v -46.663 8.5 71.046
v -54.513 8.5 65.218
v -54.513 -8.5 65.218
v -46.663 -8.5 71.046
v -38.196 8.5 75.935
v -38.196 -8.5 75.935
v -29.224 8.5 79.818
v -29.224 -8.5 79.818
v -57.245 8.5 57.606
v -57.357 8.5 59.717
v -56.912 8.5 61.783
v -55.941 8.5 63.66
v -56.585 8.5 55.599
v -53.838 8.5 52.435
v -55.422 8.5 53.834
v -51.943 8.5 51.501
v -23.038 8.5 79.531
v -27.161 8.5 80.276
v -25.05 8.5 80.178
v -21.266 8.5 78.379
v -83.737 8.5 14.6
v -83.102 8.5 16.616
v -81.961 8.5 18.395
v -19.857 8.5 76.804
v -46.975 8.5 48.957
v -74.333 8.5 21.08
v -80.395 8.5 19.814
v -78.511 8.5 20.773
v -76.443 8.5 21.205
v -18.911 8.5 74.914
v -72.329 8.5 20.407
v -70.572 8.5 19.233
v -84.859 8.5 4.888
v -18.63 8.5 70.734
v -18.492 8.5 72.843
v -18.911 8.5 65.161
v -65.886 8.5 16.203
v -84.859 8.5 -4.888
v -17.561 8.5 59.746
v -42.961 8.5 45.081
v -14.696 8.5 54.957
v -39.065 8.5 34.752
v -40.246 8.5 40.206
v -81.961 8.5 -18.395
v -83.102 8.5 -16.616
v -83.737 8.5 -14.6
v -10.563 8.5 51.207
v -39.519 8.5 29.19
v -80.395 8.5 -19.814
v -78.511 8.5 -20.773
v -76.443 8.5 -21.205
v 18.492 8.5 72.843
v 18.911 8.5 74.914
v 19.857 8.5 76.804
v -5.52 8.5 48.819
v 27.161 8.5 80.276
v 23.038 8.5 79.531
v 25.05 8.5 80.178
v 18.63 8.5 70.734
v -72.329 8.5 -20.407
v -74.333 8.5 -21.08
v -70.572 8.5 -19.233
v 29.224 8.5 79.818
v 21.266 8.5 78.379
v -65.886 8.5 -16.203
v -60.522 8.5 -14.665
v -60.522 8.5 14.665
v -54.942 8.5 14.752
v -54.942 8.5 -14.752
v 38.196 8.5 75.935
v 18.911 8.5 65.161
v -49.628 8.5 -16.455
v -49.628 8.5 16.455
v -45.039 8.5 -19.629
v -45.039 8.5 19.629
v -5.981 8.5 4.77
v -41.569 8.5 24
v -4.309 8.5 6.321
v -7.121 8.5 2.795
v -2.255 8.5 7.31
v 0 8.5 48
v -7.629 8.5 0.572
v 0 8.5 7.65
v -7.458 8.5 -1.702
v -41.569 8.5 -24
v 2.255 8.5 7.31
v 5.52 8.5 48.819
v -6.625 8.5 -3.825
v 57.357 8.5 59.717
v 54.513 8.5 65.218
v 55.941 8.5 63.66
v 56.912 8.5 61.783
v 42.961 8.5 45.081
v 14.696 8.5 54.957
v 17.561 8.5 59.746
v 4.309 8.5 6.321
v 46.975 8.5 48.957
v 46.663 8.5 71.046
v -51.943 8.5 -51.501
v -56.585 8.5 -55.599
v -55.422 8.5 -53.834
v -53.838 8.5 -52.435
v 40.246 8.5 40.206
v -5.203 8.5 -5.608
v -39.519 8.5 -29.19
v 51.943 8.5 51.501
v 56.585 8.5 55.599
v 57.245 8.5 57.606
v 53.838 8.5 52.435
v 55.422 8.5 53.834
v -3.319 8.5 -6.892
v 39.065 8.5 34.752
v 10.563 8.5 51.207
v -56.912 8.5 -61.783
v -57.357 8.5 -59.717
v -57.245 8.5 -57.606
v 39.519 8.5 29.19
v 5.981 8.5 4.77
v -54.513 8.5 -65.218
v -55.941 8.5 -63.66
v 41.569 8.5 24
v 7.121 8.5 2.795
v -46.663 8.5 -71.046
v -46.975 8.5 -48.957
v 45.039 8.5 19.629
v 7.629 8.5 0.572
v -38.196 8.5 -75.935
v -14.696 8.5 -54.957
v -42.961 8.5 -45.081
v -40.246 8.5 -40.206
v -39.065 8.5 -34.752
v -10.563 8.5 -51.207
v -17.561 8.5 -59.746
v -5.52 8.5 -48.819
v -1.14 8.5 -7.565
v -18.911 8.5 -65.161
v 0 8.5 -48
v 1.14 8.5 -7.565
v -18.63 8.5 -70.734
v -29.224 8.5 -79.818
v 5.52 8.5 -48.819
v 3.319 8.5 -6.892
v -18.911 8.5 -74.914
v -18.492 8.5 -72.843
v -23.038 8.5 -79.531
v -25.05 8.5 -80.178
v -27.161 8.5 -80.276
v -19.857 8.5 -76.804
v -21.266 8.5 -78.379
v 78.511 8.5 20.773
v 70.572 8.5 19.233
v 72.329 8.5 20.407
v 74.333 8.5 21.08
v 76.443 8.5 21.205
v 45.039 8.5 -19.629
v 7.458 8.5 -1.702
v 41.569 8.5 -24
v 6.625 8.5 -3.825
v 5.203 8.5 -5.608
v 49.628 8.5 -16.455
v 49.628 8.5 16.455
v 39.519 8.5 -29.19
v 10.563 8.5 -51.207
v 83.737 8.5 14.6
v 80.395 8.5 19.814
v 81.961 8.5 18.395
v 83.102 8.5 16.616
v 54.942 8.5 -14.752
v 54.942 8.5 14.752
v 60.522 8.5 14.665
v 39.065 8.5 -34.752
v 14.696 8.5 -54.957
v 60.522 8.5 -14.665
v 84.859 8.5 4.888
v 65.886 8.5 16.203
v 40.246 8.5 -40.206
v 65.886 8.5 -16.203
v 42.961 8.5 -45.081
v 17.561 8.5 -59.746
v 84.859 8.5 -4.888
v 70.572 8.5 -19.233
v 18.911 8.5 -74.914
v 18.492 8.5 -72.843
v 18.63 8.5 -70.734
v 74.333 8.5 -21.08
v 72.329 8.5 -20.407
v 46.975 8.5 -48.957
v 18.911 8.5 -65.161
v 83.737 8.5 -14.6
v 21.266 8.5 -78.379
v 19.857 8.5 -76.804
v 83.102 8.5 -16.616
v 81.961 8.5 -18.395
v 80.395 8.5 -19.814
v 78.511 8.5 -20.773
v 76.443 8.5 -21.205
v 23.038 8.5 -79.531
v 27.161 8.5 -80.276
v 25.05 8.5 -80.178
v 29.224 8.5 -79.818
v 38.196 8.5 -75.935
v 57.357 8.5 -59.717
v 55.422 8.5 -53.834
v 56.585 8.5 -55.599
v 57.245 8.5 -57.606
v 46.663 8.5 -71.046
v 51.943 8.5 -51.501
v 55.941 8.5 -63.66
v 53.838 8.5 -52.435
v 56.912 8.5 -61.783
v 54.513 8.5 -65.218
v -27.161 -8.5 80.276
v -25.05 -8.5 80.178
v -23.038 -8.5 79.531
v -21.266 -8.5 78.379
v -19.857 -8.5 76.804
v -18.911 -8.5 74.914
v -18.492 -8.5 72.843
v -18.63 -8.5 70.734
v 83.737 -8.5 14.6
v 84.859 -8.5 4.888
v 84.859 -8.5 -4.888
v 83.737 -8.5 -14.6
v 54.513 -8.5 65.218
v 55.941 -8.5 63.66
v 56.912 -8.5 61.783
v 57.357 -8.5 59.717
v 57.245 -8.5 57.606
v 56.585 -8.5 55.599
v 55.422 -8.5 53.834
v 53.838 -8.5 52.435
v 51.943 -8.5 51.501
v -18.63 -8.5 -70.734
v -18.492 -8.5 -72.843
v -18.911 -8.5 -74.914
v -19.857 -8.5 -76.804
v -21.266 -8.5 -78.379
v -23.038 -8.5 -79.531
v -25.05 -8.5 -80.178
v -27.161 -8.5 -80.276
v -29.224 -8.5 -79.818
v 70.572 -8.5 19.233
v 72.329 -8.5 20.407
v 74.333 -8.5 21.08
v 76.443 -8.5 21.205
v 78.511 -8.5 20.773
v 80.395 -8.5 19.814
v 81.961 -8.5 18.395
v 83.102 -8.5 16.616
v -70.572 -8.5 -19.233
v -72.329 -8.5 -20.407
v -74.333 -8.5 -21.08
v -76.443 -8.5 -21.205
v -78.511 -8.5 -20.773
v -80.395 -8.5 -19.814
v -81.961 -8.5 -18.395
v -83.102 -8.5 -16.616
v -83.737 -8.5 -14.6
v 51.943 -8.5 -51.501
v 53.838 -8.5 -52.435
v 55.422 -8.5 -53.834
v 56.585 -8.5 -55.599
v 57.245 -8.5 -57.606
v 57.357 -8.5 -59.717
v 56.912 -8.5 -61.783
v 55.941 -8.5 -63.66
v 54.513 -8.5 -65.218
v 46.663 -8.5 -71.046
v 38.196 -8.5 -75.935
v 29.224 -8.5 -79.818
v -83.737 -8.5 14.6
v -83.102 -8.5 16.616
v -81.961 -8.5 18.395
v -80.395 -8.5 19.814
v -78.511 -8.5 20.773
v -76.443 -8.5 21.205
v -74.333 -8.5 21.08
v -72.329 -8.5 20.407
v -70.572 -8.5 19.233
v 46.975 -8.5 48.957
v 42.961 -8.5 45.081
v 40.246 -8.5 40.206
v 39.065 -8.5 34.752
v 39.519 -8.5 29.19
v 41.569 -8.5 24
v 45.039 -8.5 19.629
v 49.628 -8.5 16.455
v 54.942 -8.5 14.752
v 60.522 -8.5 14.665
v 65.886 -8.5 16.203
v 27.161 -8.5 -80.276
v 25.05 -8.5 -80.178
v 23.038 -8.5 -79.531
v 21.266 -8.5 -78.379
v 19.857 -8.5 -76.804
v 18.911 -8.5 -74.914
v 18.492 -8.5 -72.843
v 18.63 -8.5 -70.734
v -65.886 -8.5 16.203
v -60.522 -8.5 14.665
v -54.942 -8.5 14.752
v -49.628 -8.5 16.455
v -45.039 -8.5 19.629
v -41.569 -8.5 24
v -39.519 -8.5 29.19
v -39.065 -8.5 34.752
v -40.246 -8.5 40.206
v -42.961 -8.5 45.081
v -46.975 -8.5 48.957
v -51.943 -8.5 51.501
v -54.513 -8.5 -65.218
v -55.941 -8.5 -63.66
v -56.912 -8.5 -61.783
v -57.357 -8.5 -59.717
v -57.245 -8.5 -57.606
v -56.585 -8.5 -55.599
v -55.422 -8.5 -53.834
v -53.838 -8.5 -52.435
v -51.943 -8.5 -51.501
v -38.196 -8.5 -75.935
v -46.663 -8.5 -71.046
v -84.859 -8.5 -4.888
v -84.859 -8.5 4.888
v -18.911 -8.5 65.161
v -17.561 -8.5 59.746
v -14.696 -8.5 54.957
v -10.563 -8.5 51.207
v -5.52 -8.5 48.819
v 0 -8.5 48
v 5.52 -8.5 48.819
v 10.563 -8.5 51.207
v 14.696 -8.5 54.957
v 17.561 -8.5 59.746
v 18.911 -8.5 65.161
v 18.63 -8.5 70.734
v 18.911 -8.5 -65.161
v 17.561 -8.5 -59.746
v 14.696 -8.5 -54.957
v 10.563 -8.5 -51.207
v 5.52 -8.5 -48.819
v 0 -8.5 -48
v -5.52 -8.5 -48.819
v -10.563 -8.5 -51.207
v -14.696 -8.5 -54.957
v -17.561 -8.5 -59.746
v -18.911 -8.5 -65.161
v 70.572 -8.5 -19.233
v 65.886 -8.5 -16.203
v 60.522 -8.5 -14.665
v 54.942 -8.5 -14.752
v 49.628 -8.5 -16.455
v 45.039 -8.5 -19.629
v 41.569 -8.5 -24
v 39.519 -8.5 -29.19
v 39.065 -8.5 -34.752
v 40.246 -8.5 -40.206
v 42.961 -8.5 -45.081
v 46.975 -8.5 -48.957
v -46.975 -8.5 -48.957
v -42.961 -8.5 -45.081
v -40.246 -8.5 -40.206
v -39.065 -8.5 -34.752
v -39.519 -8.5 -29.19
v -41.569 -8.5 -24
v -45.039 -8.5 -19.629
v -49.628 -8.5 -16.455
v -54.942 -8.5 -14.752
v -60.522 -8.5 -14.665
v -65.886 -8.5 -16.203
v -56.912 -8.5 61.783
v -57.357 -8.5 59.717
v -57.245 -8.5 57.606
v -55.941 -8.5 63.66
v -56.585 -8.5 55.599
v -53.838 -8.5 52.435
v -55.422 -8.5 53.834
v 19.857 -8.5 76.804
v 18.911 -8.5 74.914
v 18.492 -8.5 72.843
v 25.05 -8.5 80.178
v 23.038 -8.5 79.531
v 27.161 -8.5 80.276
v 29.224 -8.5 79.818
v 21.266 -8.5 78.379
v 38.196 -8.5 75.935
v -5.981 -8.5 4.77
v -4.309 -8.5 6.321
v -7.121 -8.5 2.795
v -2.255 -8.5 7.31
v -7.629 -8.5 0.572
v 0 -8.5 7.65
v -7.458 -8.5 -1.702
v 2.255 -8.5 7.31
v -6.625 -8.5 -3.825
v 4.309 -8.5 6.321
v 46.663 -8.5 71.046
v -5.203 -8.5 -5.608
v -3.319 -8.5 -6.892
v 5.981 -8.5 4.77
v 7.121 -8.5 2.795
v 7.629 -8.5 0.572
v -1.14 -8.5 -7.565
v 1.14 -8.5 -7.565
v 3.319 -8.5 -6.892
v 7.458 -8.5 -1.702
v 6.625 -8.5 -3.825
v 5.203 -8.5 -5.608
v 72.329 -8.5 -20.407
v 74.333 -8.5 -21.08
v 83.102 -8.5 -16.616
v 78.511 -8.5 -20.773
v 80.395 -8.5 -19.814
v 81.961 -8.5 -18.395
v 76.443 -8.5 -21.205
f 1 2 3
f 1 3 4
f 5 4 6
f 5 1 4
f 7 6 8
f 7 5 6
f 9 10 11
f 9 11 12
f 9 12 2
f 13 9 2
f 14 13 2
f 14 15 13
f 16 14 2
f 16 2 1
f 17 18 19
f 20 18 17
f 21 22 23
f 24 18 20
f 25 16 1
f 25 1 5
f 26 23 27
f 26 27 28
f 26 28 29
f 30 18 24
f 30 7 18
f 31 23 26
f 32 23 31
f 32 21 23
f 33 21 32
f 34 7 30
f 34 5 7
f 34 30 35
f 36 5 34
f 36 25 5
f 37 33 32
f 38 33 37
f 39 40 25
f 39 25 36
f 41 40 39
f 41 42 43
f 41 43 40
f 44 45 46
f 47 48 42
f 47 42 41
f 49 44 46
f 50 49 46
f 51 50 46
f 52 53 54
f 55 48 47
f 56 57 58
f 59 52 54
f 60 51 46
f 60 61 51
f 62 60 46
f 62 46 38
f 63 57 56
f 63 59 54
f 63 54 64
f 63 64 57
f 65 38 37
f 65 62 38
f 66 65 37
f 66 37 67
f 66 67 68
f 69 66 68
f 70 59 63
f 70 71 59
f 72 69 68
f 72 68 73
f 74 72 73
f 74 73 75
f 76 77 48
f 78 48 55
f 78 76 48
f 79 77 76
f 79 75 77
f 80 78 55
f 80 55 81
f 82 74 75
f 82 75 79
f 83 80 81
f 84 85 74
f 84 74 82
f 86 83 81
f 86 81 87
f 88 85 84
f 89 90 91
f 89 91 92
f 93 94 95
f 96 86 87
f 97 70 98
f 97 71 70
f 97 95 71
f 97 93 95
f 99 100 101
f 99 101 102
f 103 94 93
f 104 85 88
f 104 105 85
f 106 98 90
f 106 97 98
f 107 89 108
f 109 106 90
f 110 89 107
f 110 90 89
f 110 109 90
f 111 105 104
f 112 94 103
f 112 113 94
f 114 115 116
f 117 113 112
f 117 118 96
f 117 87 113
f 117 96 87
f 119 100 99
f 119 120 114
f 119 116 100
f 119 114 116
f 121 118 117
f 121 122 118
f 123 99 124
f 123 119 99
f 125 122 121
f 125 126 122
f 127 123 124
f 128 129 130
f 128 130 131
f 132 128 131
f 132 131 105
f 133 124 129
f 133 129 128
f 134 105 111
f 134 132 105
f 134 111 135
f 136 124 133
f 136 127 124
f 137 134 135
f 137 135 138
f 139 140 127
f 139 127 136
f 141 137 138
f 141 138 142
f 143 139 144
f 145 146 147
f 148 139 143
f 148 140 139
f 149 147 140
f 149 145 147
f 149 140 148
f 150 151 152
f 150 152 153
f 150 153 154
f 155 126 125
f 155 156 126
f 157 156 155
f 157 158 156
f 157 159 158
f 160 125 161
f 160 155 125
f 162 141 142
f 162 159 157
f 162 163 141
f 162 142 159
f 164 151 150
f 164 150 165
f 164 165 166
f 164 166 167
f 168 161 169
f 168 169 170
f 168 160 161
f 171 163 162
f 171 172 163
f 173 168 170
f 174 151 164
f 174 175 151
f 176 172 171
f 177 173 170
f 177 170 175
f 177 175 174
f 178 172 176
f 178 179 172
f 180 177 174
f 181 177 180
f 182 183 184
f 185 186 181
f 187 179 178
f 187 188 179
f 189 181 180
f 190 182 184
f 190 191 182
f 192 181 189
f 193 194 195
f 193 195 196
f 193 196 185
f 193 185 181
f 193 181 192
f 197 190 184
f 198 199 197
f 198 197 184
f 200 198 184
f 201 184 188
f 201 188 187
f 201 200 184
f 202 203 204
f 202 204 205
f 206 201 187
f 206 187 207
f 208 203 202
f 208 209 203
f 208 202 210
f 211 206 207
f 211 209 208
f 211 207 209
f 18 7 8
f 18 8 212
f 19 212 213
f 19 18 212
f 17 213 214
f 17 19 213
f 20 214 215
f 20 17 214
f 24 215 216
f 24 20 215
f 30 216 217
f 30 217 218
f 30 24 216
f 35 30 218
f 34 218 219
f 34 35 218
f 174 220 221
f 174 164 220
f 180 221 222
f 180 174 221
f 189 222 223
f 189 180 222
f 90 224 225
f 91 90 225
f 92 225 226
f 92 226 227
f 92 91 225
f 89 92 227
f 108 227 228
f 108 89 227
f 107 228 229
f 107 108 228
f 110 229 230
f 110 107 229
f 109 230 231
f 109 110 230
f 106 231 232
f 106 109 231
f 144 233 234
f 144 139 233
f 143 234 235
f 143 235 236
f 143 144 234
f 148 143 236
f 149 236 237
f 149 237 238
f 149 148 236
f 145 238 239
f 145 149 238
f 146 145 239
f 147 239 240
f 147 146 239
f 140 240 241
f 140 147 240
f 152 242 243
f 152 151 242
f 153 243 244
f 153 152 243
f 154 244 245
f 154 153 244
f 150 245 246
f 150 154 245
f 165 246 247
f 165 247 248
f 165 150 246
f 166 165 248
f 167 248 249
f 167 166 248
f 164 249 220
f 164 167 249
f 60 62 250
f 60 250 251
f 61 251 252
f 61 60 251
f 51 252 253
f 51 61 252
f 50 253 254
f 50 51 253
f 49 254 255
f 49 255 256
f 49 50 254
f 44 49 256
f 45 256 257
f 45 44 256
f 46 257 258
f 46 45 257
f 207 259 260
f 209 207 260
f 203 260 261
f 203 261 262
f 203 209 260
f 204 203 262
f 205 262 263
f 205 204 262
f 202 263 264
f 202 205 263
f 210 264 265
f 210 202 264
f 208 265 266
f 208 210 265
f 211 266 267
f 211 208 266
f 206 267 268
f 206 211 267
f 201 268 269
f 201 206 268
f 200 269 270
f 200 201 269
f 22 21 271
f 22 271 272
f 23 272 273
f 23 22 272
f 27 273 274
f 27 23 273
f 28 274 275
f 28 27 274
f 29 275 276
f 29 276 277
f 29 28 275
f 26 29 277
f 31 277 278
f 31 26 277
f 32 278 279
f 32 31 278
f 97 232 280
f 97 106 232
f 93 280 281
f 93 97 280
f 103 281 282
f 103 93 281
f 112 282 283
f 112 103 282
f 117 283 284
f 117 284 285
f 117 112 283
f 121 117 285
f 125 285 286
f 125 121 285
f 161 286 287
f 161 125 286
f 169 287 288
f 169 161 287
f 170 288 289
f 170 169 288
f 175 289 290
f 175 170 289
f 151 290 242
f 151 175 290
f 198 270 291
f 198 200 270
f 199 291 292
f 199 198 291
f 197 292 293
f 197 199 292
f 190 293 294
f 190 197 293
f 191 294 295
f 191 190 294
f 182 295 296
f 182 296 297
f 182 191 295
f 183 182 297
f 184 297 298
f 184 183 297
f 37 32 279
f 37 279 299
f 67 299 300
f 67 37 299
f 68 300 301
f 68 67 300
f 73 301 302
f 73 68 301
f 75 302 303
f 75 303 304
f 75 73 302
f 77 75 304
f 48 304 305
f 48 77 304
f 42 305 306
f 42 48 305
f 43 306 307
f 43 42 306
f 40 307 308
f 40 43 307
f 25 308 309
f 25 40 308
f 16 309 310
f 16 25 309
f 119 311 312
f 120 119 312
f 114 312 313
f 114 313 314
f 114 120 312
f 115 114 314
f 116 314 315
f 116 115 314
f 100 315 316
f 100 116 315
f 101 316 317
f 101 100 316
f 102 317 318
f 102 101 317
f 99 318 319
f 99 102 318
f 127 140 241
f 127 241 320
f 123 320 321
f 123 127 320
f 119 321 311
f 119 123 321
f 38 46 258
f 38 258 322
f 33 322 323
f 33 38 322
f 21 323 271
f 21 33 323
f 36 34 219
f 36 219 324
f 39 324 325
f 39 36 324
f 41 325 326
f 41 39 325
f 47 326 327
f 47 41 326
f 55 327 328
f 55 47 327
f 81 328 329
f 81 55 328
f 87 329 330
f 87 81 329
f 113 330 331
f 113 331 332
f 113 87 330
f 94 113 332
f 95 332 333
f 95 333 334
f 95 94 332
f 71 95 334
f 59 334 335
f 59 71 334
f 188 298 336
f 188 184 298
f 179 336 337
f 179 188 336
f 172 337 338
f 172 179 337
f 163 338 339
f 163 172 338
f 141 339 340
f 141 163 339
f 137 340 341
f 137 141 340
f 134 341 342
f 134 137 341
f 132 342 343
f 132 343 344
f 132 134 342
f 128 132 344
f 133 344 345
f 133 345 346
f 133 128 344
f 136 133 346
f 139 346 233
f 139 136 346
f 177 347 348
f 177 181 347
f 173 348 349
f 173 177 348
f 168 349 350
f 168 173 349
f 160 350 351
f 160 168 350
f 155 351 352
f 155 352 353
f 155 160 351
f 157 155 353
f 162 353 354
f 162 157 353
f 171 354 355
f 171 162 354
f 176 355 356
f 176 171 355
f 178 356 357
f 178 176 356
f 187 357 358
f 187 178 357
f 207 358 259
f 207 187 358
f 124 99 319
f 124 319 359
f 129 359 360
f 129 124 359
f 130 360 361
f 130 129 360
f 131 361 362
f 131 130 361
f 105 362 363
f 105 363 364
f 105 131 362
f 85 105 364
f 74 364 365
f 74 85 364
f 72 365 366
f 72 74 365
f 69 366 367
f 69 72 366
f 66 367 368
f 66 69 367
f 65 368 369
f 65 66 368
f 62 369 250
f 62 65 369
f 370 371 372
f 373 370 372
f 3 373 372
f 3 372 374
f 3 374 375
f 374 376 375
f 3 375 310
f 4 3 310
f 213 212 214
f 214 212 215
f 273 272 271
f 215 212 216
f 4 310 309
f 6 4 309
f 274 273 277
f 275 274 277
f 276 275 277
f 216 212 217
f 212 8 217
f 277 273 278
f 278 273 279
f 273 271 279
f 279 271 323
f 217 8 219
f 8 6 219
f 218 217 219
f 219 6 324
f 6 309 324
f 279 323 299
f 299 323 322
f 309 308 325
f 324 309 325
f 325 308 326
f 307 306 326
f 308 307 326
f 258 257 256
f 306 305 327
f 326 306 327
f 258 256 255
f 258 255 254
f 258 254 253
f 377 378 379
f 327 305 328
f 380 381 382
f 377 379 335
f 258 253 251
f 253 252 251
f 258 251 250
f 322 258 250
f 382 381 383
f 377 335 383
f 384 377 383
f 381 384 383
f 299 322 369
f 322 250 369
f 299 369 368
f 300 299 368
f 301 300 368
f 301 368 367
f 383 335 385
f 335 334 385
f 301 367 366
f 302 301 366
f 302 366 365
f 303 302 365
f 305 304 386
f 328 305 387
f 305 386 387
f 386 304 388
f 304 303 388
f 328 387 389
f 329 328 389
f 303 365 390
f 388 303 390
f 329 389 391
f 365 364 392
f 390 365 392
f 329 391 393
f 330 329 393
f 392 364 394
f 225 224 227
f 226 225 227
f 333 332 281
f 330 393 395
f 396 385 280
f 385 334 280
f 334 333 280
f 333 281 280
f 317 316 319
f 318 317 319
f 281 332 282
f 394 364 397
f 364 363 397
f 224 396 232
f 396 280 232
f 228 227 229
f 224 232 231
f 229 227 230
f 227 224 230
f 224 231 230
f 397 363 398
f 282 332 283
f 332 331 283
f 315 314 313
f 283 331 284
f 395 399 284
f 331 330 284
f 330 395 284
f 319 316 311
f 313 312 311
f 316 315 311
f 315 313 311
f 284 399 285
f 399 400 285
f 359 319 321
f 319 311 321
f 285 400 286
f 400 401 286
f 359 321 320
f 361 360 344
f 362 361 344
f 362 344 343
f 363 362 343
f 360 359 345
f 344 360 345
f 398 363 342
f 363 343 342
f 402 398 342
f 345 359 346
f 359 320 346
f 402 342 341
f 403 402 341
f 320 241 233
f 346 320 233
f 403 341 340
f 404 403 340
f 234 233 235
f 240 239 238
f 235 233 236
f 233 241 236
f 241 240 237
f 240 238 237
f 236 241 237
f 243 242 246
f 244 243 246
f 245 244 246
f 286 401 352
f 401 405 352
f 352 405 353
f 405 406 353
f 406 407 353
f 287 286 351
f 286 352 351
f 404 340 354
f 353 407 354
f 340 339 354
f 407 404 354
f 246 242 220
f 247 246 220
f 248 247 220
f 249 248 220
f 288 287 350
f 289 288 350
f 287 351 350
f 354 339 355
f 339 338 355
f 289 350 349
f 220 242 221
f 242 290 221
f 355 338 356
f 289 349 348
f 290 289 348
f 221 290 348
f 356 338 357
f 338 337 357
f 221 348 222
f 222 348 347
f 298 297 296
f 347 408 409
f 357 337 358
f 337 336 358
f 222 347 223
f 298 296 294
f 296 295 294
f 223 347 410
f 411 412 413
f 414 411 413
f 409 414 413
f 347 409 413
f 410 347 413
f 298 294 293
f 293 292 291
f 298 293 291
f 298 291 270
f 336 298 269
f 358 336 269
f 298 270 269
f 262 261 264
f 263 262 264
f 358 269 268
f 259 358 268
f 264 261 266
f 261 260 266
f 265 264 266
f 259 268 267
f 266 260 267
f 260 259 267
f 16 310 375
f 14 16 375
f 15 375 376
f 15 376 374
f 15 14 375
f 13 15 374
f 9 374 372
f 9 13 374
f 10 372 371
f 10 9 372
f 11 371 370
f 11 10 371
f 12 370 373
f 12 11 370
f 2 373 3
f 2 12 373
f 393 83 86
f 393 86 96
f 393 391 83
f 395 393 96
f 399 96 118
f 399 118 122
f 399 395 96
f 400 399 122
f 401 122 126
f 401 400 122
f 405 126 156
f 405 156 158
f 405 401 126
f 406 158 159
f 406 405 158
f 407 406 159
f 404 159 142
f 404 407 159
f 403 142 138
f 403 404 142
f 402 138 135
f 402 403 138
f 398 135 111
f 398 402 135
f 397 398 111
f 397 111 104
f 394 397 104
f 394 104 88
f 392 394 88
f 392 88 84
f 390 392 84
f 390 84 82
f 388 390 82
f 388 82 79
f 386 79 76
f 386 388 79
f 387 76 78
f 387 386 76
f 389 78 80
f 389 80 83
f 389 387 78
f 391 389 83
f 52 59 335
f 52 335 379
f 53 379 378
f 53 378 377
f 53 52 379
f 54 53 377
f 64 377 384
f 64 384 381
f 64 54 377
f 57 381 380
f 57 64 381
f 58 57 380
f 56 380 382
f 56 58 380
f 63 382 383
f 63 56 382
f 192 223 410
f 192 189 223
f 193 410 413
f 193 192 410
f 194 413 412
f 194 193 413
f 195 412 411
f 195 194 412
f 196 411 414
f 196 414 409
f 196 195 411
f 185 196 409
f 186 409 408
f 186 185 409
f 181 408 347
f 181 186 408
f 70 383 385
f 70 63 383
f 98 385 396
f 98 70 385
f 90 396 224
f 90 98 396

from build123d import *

# Parameters (mm, degrees)
CROQUIS1_R                   = 7.65
SALIENTE_EXTRUIR1_DEPTH      = 8.5
CROQUIS2_R                   = 7.65
CROQUIS2_R_2                 = 5
SALIENTE_EXTRUIR2_DEPTH      = 21.5
SALIENTE_EXTRUIR3_REACH      = 132.896
SALIENTE_EXTRUIR3_END_RADIUS = 7.65
SALIENTE_EXTRUIR3_START      = 12
CROQUIS3_R                   = 6.5
CORTAR_EXTRUIR1_REACH        = 129.309
CORTAR_EXTRUIR1_END_RADIUS   = 5
CROQUIS4_R                   = 2.25


with BuildPart() as part:
    # Croquis1 → Saliente-Extruir1 (new, symmetric)
    with BuildSketch(Plane(origin=(0, 0, 0), x_dir=(1, 0, 0), z_dir=(0, 1, 0))):
        with BuildLine():
            ThreePointArc((-18.62950636, 70.733830846), (-21.266037972, 78.379045573), (-29.224003483, 79.818278736))
            ThreePointArc((-29.224003483, 79.818278736), (-42.5, 73.612159322), (-54.51265533, 65.217868785))
            ThreePointArc((-54.51265533, 65.217868785), (-57.245225604, 57.606451909), (-51.942541239, 51.500541191))
            ThreePointArc((-51.942541239, 51.500541191), (-41.569219382, 24), (-70.572047599, 19.233289655))
            ThreePointArc((-70.572047599, 19.233289655), (-78.511263577, 20.772593665), (-83.736658814, 14.600409951))
            ThreePointArc((-83.736658814, 14.600409951), (-85, 0), (-83.736658814, -14.600409951))
            ThreePointArc((-83.736658814, -14.600409951), (-78.511263577, -20.772593665), (-70.572047599, -19.233289655))
            ThreePointArc((-70.572047599, -19.233289655), (-41.569219382, -24), (-51.942541239, -51.500541191))
            ThreePointArc((-51.942541239, -51.500541191), (-57.245225604, -57.606451909), (-54.51265533, -65.217868785))
            ThreePointArc((-54.51265533, -65.217868785), (-42.5, -73.612159322), (-29.224003483, -79.818278736))
            ThreePointArc((-29.224003483, -79.818278736), (-21.266037972, -78.379045573), (-18.62950636, -70.733830846))
            ThreePointArc((-18.62950636, -70.733830846), (0, -48), (18.62950636, -70.733830846))
            ThreePointArc((18.62950636, -70.733830846), (21.266037972, -78.379045573), (29.224003483, -79.818278736))
            ThreePointArc((29.224003483, -79.818278736), (42.5, -73.612159322), (54.51265533, -65.217868785))
            ThreePointArc((54.51265533, -65.217868785), (57.245225604, -57.606451909), (51.942541239, -51.500541191))
            ThreePointArc((51.942541239, -51.500541191), (41.569219382, -24), (70.572047599, -19.233289655))
            ThreePointArc((70.572047599, -19.233289655), (78.511263577, -20.772593665), (83.736658814, -14.600409951))
            ThreePointArc((83.736658814, -14.600409951), (85, 0), (83.736658814, 14.600409951))
            ThreePointArc((83.736658814, 14.600409951), (78.511263577, 20.772593665), (70.572047599, 19.233289655))
            ThreePointArc((70.572047599, 19.233289655), (41.569219382, 24), (51.942541239, 51.500541191))
            ThreePointArc((51.942541239, 51.500541191), (57.245225604, 57.606451909), (54.51265533, 65.217868785))
            ThreePointArc((54.51265533, 65.217868785), (42.5, 73.612159322), (29.224003483, 79.818278736))
            ThreePointArc((29.224003483, 79.818278736), (21.266037972, 78.379045573), (18.62950636, 70.733830846))
            ThreePointArc((18.62950636, 70.733830846), (0, 48), (-18.62950636, 70.733830846))
        make_face()
        with Locations(Location((0, 0, 0), (0, 0, 270))):
            Circle(CROQUIS1_R, mode=Mode.SUBTRACT)
    extrude(amount=SALIENTE_EXTRUIR1_DEPTH, both=True)


with BuildPart() as body_2:
    # Croquis2 → Saliente-Extruir2 (new body)
    with BuildSketch(Plane(origin=(0, 0, 0), x_dir=(1, 0, 0), z_dir=(0, 1, 0))):
        with Locations(Location((0, 0, 0), (0, 0, 270))):
            Circle(CROQUIS2_R)
        with Locations(Location((0, 0, 0), (0, 0, 270))):
            Circle(CROQUIS2_R_2, mode=Mode.SUBTRACT)
    extrude(amount=SALIENTE_EXTRUIR2_DEPTH)

    # Simetría3: body 2 across plane


with BuildPart() as body_2_1:
    add(body_2.part)
    add(body_2.part.mirror(Plane.ZX))

    # Saliente-Extruir3: up to this cylinder (the profile starts outside it)
    saliente_extruir3_end = Plane(origin=(0, 15, 0), z_dir=(0, -1, 0)) * Cylinder(SALIENTE_EXTRUIR3_END_RADIUS, 282.092, mode=Mode.PRIVATE)
    # Croquis3 → Saliente-Extruir3 (add, up to the surface)
    with BuildSketch(Plane.XY.offset(SALIENTE_EXTRUIR3_START), mode=Mode.PRIVATE) as saliente_extruir3_sk1:
        with Locations((0, 15)):
            Circle(CROQUIS3_R)
        Polygon((0, 10.958548116), (3.5, 12.979274058), (3.5, 17.020725942), (0, 19.041451884), (-3.5, 17.020725942), (-3.5, 12.979274058), align=None, mode=Mode.SUBTRACT)
    saliente_extruir3_tool1 = extrude(saliente_extruir3_sk1.sketch, amount=-SALIENTE_EXTRUIR3_REACH, mode=Mode.PRIVATE) - saliente_extruir3_end
    add(saliente_extruir3_tool1.solids().sort_by_distance((-6.316152, 15, 12))[0])

    # Cortar-Extruir1: up to this cylinder (the profile starts outside it)
    cortar_extruir1_end = Plane(origin=(0, 15, 0), z_dir=(0, -1, 0)) * Cylinder(CORTAR_EXTRUIR1_END_RADIUS, 269.618, mode=Mode.PRIVATE)
    # Croquis4 → Cortar-Extruir1 (cut, up to the surface)
    with BuildSketch(Plane.XY.offset(12), mode=Mode.PRIVATE) as cortar_extruir1_sk1:
        with Locations((0, 15)):
            Circle(CROQUIS4_R)
    cortar_extruir1_tool1 = extrude(cortar_extruir1_sk1.sketch, amount=-CORTAR_EXTRUIR1_REACH, mode=Mode.PRIVATE) - cortar_extruir1_end
    add(cortar_extruir1_tool1.solids().sort_by_distance((0, 15, 12))[0], mode=Mode.SUBTRACT)


solid = part.part
